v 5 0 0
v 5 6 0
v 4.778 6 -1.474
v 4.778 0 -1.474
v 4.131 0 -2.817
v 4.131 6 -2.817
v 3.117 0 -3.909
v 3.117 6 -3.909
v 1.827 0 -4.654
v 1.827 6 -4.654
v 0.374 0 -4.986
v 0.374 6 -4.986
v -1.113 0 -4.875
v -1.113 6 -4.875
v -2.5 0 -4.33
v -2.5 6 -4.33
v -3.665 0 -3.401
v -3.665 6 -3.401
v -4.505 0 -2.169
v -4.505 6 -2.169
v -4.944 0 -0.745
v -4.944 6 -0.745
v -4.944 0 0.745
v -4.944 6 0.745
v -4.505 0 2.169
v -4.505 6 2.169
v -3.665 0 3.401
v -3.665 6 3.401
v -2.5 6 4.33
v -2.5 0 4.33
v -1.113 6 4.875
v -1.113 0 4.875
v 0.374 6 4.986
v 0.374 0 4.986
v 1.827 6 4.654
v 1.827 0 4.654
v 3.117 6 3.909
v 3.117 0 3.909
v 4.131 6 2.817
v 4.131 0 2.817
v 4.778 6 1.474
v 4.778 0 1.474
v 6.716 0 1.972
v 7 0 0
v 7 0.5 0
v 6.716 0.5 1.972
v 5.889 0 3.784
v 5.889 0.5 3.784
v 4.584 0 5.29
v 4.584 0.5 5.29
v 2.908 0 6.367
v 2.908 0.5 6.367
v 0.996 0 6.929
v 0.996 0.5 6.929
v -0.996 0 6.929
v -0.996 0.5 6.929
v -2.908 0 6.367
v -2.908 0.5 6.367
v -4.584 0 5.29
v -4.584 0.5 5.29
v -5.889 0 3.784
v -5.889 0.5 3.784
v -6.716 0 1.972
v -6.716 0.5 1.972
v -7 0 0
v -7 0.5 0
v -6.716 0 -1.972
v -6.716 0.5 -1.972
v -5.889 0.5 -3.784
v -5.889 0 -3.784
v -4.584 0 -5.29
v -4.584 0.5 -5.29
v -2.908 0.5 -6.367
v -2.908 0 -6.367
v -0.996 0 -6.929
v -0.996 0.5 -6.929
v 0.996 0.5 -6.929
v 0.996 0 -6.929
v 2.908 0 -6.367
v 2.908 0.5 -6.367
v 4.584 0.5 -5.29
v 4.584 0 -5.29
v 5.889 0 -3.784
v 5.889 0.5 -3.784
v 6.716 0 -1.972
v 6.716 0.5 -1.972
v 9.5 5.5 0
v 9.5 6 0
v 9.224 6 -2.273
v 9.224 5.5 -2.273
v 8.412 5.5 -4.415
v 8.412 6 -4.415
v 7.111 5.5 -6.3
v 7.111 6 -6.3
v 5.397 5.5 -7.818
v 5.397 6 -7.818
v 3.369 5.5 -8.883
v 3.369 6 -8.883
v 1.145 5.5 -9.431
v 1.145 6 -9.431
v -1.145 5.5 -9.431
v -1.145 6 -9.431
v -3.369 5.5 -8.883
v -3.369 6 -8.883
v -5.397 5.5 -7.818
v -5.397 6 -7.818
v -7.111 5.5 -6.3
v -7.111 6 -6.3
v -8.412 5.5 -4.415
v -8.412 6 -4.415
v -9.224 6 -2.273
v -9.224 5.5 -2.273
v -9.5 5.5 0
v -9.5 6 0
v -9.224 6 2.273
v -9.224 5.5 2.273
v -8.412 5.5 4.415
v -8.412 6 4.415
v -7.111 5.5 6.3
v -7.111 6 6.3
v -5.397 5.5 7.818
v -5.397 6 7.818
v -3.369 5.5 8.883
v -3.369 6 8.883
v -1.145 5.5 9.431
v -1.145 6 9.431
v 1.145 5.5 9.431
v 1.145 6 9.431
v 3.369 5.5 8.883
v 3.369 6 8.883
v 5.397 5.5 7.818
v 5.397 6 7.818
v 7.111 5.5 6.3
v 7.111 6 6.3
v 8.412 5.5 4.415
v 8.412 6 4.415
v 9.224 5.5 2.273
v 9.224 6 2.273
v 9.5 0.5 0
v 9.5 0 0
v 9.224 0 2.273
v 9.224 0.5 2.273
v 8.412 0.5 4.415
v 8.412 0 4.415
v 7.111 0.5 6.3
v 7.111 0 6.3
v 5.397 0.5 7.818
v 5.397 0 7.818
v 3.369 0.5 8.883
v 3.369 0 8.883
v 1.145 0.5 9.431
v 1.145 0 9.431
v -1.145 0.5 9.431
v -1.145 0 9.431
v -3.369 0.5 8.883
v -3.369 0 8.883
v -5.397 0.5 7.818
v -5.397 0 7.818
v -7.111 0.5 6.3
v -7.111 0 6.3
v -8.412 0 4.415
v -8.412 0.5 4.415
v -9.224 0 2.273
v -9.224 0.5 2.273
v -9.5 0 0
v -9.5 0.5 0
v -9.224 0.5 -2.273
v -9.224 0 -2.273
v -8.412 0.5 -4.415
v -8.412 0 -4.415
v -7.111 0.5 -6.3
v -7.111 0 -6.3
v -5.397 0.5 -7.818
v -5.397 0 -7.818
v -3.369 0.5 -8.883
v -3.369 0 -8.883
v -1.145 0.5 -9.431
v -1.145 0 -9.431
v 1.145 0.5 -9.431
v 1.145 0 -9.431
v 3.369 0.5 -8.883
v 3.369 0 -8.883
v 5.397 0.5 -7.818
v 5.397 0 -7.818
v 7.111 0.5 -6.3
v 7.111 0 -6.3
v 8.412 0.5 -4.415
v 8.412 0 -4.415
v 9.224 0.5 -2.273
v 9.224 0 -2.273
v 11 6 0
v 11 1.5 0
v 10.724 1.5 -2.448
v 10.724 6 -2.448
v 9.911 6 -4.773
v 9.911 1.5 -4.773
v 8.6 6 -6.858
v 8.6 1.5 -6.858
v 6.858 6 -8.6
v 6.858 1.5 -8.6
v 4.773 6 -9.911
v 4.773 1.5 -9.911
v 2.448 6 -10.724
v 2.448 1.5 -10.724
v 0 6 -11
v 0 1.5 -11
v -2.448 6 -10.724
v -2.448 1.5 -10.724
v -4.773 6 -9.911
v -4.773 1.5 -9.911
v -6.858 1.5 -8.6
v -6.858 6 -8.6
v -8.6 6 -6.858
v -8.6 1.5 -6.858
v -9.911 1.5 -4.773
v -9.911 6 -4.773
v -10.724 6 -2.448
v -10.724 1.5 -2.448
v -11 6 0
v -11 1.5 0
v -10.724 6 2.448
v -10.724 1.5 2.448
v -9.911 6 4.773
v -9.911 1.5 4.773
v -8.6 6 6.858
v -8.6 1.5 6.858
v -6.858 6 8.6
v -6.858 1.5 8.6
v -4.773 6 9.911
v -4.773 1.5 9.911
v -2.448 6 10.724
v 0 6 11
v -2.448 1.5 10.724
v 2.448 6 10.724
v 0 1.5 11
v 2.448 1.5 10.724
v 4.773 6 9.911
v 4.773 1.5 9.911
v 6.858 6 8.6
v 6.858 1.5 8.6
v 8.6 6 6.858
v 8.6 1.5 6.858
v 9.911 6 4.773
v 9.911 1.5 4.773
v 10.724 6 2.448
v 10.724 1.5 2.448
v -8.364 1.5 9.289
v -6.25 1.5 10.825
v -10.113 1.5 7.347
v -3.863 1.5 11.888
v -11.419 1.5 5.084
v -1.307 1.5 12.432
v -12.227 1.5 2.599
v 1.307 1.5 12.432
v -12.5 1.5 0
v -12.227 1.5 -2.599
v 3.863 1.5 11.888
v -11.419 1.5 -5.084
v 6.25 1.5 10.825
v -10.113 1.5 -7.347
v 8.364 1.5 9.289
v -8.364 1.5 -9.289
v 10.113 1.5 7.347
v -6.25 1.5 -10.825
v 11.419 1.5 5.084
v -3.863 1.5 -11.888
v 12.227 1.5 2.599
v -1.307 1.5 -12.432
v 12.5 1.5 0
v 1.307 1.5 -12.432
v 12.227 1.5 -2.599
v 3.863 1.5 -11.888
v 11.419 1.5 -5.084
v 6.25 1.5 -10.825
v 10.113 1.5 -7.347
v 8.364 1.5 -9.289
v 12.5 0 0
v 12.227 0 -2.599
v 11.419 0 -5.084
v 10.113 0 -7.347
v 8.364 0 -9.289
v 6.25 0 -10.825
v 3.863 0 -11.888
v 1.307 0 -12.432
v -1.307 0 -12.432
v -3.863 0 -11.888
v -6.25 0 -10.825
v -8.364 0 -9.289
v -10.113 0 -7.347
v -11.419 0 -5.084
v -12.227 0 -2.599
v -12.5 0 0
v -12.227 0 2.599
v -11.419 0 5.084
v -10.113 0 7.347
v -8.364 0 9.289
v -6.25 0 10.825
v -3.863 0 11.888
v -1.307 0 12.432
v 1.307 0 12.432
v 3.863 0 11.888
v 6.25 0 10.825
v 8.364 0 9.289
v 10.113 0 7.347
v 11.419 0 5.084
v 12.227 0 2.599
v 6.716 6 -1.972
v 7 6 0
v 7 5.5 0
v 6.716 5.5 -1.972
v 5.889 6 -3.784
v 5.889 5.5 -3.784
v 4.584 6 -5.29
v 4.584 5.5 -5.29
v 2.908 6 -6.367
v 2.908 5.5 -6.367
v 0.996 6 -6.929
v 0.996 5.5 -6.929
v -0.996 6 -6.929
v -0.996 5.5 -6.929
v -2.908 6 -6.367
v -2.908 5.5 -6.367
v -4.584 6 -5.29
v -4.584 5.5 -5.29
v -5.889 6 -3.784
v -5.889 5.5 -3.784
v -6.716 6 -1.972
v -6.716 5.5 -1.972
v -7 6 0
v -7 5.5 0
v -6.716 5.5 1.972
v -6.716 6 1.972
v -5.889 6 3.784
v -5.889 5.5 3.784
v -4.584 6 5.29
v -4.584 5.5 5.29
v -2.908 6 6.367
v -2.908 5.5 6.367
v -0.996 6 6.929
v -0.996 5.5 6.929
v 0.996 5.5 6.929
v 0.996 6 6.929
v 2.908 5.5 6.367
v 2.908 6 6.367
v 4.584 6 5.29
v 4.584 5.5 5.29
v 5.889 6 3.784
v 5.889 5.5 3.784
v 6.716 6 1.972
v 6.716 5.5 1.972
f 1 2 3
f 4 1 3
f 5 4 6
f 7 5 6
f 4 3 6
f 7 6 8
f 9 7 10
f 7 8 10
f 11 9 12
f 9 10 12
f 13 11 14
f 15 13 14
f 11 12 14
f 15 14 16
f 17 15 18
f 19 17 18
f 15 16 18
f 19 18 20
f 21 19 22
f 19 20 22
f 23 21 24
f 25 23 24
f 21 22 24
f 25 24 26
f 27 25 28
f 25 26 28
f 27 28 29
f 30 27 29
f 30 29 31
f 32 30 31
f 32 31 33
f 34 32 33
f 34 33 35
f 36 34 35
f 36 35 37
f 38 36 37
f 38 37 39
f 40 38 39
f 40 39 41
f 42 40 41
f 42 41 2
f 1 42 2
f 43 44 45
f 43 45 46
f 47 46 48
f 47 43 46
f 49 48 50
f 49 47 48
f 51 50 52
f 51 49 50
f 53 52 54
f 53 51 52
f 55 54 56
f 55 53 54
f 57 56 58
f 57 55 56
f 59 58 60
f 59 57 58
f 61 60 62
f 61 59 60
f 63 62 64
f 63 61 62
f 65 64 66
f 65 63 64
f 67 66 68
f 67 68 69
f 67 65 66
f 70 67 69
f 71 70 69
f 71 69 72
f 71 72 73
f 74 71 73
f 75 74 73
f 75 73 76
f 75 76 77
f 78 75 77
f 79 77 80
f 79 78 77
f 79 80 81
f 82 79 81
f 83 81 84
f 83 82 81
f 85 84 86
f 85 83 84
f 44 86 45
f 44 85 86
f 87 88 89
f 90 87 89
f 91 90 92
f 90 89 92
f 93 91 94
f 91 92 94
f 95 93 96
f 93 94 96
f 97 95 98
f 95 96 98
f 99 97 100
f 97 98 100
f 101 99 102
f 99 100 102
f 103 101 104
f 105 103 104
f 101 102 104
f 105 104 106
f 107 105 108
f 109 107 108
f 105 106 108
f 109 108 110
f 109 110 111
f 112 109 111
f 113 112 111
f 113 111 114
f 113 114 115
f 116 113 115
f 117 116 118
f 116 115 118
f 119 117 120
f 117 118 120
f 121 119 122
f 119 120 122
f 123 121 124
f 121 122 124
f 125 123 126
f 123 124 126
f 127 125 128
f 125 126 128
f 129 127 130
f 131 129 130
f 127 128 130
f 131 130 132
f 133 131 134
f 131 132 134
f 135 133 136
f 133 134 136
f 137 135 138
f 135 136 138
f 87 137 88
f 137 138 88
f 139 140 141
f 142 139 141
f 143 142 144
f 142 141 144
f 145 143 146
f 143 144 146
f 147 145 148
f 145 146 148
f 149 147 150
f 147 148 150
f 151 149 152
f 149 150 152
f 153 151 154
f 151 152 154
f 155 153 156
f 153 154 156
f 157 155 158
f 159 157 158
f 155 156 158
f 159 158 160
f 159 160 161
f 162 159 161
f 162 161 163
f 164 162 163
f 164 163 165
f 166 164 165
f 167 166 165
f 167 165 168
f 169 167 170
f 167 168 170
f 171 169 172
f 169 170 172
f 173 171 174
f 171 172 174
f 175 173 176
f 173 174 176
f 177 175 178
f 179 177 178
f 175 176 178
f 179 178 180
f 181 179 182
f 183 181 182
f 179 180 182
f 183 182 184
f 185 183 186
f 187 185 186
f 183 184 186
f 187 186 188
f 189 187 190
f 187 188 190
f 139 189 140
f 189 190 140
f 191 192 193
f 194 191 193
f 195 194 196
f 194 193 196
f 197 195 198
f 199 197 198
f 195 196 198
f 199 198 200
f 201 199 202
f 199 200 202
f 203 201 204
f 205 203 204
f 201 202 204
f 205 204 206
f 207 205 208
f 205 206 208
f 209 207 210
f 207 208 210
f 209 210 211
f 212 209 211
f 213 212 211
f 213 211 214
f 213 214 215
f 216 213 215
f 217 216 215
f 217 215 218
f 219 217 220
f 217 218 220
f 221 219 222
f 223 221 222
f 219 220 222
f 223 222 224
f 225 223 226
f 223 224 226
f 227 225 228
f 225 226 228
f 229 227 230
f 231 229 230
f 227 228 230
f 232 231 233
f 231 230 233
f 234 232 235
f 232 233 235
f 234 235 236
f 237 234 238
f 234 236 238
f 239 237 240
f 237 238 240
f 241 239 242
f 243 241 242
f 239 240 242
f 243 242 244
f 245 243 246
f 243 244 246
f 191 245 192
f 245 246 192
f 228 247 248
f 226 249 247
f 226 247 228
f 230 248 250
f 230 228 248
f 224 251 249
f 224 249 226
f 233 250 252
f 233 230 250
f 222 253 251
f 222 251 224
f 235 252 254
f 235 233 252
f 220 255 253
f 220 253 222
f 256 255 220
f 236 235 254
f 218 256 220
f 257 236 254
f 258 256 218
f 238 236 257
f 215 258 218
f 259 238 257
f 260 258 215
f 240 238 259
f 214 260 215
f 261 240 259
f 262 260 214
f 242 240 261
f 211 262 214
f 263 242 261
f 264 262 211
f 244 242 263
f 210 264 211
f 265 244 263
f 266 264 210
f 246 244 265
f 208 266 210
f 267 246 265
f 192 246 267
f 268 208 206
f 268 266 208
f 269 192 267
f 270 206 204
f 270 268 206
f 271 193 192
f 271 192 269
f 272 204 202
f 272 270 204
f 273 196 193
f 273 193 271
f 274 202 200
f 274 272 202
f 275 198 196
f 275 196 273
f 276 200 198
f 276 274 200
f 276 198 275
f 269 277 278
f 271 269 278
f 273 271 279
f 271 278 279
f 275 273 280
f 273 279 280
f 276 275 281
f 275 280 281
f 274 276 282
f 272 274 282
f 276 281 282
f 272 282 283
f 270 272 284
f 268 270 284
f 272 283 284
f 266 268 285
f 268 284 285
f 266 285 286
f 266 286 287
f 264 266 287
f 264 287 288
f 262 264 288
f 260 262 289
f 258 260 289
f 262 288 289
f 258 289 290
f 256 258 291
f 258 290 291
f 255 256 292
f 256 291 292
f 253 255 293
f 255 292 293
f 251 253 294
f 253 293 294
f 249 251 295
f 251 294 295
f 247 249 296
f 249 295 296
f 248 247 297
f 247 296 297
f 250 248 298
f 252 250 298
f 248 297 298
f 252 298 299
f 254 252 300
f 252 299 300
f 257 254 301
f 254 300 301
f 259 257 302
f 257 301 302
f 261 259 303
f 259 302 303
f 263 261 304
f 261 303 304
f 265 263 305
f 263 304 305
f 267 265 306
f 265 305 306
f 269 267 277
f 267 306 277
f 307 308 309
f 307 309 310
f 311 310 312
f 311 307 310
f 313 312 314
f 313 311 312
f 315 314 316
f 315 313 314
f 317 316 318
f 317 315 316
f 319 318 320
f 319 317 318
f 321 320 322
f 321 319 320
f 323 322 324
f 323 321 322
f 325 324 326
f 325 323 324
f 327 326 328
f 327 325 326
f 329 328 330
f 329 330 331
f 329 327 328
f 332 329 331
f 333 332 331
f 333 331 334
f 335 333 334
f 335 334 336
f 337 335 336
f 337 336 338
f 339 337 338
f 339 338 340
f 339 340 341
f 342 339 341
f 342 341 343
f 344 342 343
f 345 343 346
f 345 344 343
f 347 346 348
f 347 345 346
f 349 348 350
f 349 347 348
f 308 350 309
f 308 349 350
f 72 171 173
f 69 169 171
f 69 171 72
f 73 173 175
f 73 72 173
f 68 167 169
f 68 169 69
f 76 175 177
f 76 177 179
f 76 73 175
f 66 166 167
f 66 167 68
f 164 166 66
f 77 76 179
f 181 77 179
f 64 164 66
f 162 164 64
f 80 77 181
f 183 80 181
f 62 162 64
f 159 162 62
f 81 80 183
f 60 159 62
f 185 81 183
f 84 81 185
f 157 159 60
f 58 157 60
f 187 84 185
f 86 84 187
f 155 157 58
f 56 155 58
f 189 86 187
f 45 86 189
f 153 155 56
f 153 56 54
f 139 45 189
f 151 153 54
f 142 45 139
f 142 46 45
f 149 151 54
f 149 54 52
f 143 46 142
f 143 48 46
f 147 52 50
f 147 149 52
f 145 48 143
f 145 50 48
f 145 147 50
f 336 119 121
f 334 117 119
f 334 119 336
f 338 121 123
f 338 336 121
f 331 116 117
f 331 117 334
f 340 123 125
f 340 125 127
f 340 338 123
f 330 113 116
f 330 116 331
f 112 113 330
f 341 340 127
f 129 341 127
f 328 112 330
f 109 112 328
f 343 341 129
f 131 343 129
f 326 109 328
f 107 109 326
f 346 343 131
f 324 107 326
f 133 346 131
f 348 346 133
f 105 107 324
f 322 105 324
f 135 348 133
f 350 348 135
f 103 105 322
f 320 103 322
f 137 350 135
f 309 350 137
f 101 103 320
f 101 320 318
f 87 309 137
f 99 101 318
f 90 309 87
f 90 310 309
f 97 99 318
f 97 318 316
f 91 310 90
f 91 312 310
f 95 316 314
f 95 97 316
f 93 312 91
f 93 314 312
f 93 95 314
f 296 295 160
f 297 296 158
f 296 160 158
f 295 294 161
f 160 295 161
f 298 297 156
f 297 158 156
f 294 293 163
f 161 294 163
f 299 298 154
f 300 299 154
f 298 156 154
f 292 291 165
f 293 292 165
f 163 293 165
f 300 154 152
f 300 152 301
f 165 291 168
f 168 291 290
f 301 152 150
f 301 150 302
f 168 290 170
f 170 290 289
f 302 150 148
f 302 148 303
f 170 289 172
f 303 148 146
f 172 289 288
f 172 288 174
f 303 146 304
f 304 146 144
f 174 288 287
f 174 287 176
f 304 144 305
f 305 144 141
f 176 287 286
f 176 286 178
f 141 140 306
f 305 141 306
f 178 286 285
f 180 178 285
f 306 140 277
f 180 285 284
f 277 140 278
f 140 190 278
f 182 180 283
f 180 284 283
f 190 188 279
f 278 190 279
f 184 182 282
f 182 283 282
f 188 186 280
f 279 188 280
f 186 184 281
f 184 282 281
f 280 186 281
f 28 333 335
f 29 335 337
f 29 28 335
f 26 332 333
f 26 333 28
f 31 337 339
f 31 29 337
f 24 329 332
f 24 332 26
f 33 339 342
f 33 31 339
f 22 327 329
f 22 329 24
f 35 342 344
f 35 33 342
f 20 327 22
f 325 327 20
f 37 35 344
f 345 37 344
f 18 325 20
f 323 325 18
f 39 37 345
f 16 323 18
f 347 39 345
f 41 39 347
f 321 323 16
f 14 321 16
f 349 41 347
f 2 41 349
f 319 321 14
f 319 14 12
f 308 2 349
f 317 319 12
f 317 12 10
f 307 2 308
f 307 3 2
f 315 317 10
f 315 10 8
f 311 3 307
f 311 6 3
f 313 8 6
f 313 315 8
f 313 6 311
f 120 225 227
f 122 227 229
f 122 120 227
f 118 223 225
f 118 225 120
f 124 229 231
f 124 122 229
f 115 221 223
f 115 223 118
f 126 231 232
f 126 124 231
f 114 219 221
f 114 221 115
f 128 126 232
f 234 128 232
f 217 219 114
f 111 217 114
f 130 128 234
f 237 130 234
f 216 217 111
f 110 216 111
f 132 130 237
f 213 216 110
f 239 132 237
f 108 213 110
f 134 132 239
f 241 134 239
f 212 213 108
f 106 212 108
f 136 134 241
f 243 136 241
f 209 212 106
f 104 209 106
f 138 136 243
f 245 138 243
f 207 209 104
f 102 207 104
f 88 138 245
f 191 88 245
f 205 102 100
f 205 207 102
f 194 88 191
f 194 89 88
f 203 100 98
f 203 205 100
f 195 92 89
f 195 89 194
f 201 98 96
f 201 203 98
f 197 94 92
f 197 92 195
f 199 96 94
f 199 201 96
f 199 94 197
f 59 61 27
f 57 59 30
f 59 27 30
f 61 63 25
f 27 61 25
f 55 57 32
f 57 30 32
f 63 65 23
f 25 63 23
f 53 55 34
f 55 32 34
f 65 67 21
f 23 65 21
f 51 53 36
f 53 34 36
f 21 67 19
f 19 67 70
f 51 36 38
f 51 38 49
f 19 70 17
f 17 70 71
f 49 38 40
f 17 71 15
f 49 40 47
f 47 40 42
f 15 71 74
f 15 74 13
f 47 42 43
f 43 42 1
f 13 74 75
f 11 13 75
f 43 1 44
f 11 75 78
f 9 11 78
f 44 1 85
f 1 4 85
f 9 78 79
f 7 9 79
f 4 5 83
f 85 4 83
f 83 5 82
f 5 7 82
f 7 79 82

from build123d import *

# Parameters (mm, degrees)
SKETCH_1_R          = 12.5
EXTRUDE_1_DEPTH     = 1.5
SKETCH_2_R          = 11
EXTRUDE_2_DEPTH     = 4.5
SKETCH_3_R          = 5
CUT_EXTRUDE_1_DEPTH = 9
SKETCH_4_R          = 9.5
SKETCH_4_R_2        = 7
CUT_EXTRUDE_2_DEPTH = 0.5
SKETCH_5_R          = 9.5
SKETCH_5_R_2        = 7
CUT_EXTRUDE_3_DEPTH = 0.5


with BuildPart() as part:
    # 草图1 → 凸台-拉伸1 (new body)
    with BuildSketch(Plane(origin=(0, 0, 0), x_dir=(1, 0, 0), z_dir=(0, 1, 0))):
        Circle(SKETCH_1_R)
    extrude(amount=EXTRUDE_1_DEPTH)

    # 草图2 → 凸台-拉伸2 (add)
    with BuildSketch(Plane(origin=(0, 1.5, 0), x_dir=(1, 0, 0), z_dir=(0, 1, 0))):
        Circle(SKETCH_2_R)
    extrude(amount=EXTRUDE_2_DEPTH)

    # 草图3 → 切除-拉伸1 (cut)
    with BuildSketch(Plane(origin=(0, 6, 0), x_dir=(1, 0, 0), z_dir=(0, 1, 0))):
        Circle(SKETCH_3_R)
    extrude(amount=-CUT_EXTRUDE_1_DEPTH, mode=Mode.SUBTRACT)

    # 草图4 → 切除-拉伸2 (cut)
    with BuildSketch(Plane.XZ):
        Circle(SKETCH_4_R)
        Circle(SKETCH_4_R_2, mode=Mode.SUBTRACT)
    extrude(amount=-CUT_EXTRUDE_2_DEPTH, mode=Mode.SUBTRACT)

    # 草图5 → 切除-拉伸3 (cut)
    with BuildSketch(Plane(origin=(0, 6, 0), x_dir=(1, 0, 0), z_dir=(0, 1, 0))):
        Circle(SKETCH_5_R)
        Circle(SKETCH_5_R_2, mode=Mode.SUBTRACT)
    extrude(amount=-CUT_EXTRUDE_3_DEPTH, mode=Mode.SUBTRACT)


solid = part.part
